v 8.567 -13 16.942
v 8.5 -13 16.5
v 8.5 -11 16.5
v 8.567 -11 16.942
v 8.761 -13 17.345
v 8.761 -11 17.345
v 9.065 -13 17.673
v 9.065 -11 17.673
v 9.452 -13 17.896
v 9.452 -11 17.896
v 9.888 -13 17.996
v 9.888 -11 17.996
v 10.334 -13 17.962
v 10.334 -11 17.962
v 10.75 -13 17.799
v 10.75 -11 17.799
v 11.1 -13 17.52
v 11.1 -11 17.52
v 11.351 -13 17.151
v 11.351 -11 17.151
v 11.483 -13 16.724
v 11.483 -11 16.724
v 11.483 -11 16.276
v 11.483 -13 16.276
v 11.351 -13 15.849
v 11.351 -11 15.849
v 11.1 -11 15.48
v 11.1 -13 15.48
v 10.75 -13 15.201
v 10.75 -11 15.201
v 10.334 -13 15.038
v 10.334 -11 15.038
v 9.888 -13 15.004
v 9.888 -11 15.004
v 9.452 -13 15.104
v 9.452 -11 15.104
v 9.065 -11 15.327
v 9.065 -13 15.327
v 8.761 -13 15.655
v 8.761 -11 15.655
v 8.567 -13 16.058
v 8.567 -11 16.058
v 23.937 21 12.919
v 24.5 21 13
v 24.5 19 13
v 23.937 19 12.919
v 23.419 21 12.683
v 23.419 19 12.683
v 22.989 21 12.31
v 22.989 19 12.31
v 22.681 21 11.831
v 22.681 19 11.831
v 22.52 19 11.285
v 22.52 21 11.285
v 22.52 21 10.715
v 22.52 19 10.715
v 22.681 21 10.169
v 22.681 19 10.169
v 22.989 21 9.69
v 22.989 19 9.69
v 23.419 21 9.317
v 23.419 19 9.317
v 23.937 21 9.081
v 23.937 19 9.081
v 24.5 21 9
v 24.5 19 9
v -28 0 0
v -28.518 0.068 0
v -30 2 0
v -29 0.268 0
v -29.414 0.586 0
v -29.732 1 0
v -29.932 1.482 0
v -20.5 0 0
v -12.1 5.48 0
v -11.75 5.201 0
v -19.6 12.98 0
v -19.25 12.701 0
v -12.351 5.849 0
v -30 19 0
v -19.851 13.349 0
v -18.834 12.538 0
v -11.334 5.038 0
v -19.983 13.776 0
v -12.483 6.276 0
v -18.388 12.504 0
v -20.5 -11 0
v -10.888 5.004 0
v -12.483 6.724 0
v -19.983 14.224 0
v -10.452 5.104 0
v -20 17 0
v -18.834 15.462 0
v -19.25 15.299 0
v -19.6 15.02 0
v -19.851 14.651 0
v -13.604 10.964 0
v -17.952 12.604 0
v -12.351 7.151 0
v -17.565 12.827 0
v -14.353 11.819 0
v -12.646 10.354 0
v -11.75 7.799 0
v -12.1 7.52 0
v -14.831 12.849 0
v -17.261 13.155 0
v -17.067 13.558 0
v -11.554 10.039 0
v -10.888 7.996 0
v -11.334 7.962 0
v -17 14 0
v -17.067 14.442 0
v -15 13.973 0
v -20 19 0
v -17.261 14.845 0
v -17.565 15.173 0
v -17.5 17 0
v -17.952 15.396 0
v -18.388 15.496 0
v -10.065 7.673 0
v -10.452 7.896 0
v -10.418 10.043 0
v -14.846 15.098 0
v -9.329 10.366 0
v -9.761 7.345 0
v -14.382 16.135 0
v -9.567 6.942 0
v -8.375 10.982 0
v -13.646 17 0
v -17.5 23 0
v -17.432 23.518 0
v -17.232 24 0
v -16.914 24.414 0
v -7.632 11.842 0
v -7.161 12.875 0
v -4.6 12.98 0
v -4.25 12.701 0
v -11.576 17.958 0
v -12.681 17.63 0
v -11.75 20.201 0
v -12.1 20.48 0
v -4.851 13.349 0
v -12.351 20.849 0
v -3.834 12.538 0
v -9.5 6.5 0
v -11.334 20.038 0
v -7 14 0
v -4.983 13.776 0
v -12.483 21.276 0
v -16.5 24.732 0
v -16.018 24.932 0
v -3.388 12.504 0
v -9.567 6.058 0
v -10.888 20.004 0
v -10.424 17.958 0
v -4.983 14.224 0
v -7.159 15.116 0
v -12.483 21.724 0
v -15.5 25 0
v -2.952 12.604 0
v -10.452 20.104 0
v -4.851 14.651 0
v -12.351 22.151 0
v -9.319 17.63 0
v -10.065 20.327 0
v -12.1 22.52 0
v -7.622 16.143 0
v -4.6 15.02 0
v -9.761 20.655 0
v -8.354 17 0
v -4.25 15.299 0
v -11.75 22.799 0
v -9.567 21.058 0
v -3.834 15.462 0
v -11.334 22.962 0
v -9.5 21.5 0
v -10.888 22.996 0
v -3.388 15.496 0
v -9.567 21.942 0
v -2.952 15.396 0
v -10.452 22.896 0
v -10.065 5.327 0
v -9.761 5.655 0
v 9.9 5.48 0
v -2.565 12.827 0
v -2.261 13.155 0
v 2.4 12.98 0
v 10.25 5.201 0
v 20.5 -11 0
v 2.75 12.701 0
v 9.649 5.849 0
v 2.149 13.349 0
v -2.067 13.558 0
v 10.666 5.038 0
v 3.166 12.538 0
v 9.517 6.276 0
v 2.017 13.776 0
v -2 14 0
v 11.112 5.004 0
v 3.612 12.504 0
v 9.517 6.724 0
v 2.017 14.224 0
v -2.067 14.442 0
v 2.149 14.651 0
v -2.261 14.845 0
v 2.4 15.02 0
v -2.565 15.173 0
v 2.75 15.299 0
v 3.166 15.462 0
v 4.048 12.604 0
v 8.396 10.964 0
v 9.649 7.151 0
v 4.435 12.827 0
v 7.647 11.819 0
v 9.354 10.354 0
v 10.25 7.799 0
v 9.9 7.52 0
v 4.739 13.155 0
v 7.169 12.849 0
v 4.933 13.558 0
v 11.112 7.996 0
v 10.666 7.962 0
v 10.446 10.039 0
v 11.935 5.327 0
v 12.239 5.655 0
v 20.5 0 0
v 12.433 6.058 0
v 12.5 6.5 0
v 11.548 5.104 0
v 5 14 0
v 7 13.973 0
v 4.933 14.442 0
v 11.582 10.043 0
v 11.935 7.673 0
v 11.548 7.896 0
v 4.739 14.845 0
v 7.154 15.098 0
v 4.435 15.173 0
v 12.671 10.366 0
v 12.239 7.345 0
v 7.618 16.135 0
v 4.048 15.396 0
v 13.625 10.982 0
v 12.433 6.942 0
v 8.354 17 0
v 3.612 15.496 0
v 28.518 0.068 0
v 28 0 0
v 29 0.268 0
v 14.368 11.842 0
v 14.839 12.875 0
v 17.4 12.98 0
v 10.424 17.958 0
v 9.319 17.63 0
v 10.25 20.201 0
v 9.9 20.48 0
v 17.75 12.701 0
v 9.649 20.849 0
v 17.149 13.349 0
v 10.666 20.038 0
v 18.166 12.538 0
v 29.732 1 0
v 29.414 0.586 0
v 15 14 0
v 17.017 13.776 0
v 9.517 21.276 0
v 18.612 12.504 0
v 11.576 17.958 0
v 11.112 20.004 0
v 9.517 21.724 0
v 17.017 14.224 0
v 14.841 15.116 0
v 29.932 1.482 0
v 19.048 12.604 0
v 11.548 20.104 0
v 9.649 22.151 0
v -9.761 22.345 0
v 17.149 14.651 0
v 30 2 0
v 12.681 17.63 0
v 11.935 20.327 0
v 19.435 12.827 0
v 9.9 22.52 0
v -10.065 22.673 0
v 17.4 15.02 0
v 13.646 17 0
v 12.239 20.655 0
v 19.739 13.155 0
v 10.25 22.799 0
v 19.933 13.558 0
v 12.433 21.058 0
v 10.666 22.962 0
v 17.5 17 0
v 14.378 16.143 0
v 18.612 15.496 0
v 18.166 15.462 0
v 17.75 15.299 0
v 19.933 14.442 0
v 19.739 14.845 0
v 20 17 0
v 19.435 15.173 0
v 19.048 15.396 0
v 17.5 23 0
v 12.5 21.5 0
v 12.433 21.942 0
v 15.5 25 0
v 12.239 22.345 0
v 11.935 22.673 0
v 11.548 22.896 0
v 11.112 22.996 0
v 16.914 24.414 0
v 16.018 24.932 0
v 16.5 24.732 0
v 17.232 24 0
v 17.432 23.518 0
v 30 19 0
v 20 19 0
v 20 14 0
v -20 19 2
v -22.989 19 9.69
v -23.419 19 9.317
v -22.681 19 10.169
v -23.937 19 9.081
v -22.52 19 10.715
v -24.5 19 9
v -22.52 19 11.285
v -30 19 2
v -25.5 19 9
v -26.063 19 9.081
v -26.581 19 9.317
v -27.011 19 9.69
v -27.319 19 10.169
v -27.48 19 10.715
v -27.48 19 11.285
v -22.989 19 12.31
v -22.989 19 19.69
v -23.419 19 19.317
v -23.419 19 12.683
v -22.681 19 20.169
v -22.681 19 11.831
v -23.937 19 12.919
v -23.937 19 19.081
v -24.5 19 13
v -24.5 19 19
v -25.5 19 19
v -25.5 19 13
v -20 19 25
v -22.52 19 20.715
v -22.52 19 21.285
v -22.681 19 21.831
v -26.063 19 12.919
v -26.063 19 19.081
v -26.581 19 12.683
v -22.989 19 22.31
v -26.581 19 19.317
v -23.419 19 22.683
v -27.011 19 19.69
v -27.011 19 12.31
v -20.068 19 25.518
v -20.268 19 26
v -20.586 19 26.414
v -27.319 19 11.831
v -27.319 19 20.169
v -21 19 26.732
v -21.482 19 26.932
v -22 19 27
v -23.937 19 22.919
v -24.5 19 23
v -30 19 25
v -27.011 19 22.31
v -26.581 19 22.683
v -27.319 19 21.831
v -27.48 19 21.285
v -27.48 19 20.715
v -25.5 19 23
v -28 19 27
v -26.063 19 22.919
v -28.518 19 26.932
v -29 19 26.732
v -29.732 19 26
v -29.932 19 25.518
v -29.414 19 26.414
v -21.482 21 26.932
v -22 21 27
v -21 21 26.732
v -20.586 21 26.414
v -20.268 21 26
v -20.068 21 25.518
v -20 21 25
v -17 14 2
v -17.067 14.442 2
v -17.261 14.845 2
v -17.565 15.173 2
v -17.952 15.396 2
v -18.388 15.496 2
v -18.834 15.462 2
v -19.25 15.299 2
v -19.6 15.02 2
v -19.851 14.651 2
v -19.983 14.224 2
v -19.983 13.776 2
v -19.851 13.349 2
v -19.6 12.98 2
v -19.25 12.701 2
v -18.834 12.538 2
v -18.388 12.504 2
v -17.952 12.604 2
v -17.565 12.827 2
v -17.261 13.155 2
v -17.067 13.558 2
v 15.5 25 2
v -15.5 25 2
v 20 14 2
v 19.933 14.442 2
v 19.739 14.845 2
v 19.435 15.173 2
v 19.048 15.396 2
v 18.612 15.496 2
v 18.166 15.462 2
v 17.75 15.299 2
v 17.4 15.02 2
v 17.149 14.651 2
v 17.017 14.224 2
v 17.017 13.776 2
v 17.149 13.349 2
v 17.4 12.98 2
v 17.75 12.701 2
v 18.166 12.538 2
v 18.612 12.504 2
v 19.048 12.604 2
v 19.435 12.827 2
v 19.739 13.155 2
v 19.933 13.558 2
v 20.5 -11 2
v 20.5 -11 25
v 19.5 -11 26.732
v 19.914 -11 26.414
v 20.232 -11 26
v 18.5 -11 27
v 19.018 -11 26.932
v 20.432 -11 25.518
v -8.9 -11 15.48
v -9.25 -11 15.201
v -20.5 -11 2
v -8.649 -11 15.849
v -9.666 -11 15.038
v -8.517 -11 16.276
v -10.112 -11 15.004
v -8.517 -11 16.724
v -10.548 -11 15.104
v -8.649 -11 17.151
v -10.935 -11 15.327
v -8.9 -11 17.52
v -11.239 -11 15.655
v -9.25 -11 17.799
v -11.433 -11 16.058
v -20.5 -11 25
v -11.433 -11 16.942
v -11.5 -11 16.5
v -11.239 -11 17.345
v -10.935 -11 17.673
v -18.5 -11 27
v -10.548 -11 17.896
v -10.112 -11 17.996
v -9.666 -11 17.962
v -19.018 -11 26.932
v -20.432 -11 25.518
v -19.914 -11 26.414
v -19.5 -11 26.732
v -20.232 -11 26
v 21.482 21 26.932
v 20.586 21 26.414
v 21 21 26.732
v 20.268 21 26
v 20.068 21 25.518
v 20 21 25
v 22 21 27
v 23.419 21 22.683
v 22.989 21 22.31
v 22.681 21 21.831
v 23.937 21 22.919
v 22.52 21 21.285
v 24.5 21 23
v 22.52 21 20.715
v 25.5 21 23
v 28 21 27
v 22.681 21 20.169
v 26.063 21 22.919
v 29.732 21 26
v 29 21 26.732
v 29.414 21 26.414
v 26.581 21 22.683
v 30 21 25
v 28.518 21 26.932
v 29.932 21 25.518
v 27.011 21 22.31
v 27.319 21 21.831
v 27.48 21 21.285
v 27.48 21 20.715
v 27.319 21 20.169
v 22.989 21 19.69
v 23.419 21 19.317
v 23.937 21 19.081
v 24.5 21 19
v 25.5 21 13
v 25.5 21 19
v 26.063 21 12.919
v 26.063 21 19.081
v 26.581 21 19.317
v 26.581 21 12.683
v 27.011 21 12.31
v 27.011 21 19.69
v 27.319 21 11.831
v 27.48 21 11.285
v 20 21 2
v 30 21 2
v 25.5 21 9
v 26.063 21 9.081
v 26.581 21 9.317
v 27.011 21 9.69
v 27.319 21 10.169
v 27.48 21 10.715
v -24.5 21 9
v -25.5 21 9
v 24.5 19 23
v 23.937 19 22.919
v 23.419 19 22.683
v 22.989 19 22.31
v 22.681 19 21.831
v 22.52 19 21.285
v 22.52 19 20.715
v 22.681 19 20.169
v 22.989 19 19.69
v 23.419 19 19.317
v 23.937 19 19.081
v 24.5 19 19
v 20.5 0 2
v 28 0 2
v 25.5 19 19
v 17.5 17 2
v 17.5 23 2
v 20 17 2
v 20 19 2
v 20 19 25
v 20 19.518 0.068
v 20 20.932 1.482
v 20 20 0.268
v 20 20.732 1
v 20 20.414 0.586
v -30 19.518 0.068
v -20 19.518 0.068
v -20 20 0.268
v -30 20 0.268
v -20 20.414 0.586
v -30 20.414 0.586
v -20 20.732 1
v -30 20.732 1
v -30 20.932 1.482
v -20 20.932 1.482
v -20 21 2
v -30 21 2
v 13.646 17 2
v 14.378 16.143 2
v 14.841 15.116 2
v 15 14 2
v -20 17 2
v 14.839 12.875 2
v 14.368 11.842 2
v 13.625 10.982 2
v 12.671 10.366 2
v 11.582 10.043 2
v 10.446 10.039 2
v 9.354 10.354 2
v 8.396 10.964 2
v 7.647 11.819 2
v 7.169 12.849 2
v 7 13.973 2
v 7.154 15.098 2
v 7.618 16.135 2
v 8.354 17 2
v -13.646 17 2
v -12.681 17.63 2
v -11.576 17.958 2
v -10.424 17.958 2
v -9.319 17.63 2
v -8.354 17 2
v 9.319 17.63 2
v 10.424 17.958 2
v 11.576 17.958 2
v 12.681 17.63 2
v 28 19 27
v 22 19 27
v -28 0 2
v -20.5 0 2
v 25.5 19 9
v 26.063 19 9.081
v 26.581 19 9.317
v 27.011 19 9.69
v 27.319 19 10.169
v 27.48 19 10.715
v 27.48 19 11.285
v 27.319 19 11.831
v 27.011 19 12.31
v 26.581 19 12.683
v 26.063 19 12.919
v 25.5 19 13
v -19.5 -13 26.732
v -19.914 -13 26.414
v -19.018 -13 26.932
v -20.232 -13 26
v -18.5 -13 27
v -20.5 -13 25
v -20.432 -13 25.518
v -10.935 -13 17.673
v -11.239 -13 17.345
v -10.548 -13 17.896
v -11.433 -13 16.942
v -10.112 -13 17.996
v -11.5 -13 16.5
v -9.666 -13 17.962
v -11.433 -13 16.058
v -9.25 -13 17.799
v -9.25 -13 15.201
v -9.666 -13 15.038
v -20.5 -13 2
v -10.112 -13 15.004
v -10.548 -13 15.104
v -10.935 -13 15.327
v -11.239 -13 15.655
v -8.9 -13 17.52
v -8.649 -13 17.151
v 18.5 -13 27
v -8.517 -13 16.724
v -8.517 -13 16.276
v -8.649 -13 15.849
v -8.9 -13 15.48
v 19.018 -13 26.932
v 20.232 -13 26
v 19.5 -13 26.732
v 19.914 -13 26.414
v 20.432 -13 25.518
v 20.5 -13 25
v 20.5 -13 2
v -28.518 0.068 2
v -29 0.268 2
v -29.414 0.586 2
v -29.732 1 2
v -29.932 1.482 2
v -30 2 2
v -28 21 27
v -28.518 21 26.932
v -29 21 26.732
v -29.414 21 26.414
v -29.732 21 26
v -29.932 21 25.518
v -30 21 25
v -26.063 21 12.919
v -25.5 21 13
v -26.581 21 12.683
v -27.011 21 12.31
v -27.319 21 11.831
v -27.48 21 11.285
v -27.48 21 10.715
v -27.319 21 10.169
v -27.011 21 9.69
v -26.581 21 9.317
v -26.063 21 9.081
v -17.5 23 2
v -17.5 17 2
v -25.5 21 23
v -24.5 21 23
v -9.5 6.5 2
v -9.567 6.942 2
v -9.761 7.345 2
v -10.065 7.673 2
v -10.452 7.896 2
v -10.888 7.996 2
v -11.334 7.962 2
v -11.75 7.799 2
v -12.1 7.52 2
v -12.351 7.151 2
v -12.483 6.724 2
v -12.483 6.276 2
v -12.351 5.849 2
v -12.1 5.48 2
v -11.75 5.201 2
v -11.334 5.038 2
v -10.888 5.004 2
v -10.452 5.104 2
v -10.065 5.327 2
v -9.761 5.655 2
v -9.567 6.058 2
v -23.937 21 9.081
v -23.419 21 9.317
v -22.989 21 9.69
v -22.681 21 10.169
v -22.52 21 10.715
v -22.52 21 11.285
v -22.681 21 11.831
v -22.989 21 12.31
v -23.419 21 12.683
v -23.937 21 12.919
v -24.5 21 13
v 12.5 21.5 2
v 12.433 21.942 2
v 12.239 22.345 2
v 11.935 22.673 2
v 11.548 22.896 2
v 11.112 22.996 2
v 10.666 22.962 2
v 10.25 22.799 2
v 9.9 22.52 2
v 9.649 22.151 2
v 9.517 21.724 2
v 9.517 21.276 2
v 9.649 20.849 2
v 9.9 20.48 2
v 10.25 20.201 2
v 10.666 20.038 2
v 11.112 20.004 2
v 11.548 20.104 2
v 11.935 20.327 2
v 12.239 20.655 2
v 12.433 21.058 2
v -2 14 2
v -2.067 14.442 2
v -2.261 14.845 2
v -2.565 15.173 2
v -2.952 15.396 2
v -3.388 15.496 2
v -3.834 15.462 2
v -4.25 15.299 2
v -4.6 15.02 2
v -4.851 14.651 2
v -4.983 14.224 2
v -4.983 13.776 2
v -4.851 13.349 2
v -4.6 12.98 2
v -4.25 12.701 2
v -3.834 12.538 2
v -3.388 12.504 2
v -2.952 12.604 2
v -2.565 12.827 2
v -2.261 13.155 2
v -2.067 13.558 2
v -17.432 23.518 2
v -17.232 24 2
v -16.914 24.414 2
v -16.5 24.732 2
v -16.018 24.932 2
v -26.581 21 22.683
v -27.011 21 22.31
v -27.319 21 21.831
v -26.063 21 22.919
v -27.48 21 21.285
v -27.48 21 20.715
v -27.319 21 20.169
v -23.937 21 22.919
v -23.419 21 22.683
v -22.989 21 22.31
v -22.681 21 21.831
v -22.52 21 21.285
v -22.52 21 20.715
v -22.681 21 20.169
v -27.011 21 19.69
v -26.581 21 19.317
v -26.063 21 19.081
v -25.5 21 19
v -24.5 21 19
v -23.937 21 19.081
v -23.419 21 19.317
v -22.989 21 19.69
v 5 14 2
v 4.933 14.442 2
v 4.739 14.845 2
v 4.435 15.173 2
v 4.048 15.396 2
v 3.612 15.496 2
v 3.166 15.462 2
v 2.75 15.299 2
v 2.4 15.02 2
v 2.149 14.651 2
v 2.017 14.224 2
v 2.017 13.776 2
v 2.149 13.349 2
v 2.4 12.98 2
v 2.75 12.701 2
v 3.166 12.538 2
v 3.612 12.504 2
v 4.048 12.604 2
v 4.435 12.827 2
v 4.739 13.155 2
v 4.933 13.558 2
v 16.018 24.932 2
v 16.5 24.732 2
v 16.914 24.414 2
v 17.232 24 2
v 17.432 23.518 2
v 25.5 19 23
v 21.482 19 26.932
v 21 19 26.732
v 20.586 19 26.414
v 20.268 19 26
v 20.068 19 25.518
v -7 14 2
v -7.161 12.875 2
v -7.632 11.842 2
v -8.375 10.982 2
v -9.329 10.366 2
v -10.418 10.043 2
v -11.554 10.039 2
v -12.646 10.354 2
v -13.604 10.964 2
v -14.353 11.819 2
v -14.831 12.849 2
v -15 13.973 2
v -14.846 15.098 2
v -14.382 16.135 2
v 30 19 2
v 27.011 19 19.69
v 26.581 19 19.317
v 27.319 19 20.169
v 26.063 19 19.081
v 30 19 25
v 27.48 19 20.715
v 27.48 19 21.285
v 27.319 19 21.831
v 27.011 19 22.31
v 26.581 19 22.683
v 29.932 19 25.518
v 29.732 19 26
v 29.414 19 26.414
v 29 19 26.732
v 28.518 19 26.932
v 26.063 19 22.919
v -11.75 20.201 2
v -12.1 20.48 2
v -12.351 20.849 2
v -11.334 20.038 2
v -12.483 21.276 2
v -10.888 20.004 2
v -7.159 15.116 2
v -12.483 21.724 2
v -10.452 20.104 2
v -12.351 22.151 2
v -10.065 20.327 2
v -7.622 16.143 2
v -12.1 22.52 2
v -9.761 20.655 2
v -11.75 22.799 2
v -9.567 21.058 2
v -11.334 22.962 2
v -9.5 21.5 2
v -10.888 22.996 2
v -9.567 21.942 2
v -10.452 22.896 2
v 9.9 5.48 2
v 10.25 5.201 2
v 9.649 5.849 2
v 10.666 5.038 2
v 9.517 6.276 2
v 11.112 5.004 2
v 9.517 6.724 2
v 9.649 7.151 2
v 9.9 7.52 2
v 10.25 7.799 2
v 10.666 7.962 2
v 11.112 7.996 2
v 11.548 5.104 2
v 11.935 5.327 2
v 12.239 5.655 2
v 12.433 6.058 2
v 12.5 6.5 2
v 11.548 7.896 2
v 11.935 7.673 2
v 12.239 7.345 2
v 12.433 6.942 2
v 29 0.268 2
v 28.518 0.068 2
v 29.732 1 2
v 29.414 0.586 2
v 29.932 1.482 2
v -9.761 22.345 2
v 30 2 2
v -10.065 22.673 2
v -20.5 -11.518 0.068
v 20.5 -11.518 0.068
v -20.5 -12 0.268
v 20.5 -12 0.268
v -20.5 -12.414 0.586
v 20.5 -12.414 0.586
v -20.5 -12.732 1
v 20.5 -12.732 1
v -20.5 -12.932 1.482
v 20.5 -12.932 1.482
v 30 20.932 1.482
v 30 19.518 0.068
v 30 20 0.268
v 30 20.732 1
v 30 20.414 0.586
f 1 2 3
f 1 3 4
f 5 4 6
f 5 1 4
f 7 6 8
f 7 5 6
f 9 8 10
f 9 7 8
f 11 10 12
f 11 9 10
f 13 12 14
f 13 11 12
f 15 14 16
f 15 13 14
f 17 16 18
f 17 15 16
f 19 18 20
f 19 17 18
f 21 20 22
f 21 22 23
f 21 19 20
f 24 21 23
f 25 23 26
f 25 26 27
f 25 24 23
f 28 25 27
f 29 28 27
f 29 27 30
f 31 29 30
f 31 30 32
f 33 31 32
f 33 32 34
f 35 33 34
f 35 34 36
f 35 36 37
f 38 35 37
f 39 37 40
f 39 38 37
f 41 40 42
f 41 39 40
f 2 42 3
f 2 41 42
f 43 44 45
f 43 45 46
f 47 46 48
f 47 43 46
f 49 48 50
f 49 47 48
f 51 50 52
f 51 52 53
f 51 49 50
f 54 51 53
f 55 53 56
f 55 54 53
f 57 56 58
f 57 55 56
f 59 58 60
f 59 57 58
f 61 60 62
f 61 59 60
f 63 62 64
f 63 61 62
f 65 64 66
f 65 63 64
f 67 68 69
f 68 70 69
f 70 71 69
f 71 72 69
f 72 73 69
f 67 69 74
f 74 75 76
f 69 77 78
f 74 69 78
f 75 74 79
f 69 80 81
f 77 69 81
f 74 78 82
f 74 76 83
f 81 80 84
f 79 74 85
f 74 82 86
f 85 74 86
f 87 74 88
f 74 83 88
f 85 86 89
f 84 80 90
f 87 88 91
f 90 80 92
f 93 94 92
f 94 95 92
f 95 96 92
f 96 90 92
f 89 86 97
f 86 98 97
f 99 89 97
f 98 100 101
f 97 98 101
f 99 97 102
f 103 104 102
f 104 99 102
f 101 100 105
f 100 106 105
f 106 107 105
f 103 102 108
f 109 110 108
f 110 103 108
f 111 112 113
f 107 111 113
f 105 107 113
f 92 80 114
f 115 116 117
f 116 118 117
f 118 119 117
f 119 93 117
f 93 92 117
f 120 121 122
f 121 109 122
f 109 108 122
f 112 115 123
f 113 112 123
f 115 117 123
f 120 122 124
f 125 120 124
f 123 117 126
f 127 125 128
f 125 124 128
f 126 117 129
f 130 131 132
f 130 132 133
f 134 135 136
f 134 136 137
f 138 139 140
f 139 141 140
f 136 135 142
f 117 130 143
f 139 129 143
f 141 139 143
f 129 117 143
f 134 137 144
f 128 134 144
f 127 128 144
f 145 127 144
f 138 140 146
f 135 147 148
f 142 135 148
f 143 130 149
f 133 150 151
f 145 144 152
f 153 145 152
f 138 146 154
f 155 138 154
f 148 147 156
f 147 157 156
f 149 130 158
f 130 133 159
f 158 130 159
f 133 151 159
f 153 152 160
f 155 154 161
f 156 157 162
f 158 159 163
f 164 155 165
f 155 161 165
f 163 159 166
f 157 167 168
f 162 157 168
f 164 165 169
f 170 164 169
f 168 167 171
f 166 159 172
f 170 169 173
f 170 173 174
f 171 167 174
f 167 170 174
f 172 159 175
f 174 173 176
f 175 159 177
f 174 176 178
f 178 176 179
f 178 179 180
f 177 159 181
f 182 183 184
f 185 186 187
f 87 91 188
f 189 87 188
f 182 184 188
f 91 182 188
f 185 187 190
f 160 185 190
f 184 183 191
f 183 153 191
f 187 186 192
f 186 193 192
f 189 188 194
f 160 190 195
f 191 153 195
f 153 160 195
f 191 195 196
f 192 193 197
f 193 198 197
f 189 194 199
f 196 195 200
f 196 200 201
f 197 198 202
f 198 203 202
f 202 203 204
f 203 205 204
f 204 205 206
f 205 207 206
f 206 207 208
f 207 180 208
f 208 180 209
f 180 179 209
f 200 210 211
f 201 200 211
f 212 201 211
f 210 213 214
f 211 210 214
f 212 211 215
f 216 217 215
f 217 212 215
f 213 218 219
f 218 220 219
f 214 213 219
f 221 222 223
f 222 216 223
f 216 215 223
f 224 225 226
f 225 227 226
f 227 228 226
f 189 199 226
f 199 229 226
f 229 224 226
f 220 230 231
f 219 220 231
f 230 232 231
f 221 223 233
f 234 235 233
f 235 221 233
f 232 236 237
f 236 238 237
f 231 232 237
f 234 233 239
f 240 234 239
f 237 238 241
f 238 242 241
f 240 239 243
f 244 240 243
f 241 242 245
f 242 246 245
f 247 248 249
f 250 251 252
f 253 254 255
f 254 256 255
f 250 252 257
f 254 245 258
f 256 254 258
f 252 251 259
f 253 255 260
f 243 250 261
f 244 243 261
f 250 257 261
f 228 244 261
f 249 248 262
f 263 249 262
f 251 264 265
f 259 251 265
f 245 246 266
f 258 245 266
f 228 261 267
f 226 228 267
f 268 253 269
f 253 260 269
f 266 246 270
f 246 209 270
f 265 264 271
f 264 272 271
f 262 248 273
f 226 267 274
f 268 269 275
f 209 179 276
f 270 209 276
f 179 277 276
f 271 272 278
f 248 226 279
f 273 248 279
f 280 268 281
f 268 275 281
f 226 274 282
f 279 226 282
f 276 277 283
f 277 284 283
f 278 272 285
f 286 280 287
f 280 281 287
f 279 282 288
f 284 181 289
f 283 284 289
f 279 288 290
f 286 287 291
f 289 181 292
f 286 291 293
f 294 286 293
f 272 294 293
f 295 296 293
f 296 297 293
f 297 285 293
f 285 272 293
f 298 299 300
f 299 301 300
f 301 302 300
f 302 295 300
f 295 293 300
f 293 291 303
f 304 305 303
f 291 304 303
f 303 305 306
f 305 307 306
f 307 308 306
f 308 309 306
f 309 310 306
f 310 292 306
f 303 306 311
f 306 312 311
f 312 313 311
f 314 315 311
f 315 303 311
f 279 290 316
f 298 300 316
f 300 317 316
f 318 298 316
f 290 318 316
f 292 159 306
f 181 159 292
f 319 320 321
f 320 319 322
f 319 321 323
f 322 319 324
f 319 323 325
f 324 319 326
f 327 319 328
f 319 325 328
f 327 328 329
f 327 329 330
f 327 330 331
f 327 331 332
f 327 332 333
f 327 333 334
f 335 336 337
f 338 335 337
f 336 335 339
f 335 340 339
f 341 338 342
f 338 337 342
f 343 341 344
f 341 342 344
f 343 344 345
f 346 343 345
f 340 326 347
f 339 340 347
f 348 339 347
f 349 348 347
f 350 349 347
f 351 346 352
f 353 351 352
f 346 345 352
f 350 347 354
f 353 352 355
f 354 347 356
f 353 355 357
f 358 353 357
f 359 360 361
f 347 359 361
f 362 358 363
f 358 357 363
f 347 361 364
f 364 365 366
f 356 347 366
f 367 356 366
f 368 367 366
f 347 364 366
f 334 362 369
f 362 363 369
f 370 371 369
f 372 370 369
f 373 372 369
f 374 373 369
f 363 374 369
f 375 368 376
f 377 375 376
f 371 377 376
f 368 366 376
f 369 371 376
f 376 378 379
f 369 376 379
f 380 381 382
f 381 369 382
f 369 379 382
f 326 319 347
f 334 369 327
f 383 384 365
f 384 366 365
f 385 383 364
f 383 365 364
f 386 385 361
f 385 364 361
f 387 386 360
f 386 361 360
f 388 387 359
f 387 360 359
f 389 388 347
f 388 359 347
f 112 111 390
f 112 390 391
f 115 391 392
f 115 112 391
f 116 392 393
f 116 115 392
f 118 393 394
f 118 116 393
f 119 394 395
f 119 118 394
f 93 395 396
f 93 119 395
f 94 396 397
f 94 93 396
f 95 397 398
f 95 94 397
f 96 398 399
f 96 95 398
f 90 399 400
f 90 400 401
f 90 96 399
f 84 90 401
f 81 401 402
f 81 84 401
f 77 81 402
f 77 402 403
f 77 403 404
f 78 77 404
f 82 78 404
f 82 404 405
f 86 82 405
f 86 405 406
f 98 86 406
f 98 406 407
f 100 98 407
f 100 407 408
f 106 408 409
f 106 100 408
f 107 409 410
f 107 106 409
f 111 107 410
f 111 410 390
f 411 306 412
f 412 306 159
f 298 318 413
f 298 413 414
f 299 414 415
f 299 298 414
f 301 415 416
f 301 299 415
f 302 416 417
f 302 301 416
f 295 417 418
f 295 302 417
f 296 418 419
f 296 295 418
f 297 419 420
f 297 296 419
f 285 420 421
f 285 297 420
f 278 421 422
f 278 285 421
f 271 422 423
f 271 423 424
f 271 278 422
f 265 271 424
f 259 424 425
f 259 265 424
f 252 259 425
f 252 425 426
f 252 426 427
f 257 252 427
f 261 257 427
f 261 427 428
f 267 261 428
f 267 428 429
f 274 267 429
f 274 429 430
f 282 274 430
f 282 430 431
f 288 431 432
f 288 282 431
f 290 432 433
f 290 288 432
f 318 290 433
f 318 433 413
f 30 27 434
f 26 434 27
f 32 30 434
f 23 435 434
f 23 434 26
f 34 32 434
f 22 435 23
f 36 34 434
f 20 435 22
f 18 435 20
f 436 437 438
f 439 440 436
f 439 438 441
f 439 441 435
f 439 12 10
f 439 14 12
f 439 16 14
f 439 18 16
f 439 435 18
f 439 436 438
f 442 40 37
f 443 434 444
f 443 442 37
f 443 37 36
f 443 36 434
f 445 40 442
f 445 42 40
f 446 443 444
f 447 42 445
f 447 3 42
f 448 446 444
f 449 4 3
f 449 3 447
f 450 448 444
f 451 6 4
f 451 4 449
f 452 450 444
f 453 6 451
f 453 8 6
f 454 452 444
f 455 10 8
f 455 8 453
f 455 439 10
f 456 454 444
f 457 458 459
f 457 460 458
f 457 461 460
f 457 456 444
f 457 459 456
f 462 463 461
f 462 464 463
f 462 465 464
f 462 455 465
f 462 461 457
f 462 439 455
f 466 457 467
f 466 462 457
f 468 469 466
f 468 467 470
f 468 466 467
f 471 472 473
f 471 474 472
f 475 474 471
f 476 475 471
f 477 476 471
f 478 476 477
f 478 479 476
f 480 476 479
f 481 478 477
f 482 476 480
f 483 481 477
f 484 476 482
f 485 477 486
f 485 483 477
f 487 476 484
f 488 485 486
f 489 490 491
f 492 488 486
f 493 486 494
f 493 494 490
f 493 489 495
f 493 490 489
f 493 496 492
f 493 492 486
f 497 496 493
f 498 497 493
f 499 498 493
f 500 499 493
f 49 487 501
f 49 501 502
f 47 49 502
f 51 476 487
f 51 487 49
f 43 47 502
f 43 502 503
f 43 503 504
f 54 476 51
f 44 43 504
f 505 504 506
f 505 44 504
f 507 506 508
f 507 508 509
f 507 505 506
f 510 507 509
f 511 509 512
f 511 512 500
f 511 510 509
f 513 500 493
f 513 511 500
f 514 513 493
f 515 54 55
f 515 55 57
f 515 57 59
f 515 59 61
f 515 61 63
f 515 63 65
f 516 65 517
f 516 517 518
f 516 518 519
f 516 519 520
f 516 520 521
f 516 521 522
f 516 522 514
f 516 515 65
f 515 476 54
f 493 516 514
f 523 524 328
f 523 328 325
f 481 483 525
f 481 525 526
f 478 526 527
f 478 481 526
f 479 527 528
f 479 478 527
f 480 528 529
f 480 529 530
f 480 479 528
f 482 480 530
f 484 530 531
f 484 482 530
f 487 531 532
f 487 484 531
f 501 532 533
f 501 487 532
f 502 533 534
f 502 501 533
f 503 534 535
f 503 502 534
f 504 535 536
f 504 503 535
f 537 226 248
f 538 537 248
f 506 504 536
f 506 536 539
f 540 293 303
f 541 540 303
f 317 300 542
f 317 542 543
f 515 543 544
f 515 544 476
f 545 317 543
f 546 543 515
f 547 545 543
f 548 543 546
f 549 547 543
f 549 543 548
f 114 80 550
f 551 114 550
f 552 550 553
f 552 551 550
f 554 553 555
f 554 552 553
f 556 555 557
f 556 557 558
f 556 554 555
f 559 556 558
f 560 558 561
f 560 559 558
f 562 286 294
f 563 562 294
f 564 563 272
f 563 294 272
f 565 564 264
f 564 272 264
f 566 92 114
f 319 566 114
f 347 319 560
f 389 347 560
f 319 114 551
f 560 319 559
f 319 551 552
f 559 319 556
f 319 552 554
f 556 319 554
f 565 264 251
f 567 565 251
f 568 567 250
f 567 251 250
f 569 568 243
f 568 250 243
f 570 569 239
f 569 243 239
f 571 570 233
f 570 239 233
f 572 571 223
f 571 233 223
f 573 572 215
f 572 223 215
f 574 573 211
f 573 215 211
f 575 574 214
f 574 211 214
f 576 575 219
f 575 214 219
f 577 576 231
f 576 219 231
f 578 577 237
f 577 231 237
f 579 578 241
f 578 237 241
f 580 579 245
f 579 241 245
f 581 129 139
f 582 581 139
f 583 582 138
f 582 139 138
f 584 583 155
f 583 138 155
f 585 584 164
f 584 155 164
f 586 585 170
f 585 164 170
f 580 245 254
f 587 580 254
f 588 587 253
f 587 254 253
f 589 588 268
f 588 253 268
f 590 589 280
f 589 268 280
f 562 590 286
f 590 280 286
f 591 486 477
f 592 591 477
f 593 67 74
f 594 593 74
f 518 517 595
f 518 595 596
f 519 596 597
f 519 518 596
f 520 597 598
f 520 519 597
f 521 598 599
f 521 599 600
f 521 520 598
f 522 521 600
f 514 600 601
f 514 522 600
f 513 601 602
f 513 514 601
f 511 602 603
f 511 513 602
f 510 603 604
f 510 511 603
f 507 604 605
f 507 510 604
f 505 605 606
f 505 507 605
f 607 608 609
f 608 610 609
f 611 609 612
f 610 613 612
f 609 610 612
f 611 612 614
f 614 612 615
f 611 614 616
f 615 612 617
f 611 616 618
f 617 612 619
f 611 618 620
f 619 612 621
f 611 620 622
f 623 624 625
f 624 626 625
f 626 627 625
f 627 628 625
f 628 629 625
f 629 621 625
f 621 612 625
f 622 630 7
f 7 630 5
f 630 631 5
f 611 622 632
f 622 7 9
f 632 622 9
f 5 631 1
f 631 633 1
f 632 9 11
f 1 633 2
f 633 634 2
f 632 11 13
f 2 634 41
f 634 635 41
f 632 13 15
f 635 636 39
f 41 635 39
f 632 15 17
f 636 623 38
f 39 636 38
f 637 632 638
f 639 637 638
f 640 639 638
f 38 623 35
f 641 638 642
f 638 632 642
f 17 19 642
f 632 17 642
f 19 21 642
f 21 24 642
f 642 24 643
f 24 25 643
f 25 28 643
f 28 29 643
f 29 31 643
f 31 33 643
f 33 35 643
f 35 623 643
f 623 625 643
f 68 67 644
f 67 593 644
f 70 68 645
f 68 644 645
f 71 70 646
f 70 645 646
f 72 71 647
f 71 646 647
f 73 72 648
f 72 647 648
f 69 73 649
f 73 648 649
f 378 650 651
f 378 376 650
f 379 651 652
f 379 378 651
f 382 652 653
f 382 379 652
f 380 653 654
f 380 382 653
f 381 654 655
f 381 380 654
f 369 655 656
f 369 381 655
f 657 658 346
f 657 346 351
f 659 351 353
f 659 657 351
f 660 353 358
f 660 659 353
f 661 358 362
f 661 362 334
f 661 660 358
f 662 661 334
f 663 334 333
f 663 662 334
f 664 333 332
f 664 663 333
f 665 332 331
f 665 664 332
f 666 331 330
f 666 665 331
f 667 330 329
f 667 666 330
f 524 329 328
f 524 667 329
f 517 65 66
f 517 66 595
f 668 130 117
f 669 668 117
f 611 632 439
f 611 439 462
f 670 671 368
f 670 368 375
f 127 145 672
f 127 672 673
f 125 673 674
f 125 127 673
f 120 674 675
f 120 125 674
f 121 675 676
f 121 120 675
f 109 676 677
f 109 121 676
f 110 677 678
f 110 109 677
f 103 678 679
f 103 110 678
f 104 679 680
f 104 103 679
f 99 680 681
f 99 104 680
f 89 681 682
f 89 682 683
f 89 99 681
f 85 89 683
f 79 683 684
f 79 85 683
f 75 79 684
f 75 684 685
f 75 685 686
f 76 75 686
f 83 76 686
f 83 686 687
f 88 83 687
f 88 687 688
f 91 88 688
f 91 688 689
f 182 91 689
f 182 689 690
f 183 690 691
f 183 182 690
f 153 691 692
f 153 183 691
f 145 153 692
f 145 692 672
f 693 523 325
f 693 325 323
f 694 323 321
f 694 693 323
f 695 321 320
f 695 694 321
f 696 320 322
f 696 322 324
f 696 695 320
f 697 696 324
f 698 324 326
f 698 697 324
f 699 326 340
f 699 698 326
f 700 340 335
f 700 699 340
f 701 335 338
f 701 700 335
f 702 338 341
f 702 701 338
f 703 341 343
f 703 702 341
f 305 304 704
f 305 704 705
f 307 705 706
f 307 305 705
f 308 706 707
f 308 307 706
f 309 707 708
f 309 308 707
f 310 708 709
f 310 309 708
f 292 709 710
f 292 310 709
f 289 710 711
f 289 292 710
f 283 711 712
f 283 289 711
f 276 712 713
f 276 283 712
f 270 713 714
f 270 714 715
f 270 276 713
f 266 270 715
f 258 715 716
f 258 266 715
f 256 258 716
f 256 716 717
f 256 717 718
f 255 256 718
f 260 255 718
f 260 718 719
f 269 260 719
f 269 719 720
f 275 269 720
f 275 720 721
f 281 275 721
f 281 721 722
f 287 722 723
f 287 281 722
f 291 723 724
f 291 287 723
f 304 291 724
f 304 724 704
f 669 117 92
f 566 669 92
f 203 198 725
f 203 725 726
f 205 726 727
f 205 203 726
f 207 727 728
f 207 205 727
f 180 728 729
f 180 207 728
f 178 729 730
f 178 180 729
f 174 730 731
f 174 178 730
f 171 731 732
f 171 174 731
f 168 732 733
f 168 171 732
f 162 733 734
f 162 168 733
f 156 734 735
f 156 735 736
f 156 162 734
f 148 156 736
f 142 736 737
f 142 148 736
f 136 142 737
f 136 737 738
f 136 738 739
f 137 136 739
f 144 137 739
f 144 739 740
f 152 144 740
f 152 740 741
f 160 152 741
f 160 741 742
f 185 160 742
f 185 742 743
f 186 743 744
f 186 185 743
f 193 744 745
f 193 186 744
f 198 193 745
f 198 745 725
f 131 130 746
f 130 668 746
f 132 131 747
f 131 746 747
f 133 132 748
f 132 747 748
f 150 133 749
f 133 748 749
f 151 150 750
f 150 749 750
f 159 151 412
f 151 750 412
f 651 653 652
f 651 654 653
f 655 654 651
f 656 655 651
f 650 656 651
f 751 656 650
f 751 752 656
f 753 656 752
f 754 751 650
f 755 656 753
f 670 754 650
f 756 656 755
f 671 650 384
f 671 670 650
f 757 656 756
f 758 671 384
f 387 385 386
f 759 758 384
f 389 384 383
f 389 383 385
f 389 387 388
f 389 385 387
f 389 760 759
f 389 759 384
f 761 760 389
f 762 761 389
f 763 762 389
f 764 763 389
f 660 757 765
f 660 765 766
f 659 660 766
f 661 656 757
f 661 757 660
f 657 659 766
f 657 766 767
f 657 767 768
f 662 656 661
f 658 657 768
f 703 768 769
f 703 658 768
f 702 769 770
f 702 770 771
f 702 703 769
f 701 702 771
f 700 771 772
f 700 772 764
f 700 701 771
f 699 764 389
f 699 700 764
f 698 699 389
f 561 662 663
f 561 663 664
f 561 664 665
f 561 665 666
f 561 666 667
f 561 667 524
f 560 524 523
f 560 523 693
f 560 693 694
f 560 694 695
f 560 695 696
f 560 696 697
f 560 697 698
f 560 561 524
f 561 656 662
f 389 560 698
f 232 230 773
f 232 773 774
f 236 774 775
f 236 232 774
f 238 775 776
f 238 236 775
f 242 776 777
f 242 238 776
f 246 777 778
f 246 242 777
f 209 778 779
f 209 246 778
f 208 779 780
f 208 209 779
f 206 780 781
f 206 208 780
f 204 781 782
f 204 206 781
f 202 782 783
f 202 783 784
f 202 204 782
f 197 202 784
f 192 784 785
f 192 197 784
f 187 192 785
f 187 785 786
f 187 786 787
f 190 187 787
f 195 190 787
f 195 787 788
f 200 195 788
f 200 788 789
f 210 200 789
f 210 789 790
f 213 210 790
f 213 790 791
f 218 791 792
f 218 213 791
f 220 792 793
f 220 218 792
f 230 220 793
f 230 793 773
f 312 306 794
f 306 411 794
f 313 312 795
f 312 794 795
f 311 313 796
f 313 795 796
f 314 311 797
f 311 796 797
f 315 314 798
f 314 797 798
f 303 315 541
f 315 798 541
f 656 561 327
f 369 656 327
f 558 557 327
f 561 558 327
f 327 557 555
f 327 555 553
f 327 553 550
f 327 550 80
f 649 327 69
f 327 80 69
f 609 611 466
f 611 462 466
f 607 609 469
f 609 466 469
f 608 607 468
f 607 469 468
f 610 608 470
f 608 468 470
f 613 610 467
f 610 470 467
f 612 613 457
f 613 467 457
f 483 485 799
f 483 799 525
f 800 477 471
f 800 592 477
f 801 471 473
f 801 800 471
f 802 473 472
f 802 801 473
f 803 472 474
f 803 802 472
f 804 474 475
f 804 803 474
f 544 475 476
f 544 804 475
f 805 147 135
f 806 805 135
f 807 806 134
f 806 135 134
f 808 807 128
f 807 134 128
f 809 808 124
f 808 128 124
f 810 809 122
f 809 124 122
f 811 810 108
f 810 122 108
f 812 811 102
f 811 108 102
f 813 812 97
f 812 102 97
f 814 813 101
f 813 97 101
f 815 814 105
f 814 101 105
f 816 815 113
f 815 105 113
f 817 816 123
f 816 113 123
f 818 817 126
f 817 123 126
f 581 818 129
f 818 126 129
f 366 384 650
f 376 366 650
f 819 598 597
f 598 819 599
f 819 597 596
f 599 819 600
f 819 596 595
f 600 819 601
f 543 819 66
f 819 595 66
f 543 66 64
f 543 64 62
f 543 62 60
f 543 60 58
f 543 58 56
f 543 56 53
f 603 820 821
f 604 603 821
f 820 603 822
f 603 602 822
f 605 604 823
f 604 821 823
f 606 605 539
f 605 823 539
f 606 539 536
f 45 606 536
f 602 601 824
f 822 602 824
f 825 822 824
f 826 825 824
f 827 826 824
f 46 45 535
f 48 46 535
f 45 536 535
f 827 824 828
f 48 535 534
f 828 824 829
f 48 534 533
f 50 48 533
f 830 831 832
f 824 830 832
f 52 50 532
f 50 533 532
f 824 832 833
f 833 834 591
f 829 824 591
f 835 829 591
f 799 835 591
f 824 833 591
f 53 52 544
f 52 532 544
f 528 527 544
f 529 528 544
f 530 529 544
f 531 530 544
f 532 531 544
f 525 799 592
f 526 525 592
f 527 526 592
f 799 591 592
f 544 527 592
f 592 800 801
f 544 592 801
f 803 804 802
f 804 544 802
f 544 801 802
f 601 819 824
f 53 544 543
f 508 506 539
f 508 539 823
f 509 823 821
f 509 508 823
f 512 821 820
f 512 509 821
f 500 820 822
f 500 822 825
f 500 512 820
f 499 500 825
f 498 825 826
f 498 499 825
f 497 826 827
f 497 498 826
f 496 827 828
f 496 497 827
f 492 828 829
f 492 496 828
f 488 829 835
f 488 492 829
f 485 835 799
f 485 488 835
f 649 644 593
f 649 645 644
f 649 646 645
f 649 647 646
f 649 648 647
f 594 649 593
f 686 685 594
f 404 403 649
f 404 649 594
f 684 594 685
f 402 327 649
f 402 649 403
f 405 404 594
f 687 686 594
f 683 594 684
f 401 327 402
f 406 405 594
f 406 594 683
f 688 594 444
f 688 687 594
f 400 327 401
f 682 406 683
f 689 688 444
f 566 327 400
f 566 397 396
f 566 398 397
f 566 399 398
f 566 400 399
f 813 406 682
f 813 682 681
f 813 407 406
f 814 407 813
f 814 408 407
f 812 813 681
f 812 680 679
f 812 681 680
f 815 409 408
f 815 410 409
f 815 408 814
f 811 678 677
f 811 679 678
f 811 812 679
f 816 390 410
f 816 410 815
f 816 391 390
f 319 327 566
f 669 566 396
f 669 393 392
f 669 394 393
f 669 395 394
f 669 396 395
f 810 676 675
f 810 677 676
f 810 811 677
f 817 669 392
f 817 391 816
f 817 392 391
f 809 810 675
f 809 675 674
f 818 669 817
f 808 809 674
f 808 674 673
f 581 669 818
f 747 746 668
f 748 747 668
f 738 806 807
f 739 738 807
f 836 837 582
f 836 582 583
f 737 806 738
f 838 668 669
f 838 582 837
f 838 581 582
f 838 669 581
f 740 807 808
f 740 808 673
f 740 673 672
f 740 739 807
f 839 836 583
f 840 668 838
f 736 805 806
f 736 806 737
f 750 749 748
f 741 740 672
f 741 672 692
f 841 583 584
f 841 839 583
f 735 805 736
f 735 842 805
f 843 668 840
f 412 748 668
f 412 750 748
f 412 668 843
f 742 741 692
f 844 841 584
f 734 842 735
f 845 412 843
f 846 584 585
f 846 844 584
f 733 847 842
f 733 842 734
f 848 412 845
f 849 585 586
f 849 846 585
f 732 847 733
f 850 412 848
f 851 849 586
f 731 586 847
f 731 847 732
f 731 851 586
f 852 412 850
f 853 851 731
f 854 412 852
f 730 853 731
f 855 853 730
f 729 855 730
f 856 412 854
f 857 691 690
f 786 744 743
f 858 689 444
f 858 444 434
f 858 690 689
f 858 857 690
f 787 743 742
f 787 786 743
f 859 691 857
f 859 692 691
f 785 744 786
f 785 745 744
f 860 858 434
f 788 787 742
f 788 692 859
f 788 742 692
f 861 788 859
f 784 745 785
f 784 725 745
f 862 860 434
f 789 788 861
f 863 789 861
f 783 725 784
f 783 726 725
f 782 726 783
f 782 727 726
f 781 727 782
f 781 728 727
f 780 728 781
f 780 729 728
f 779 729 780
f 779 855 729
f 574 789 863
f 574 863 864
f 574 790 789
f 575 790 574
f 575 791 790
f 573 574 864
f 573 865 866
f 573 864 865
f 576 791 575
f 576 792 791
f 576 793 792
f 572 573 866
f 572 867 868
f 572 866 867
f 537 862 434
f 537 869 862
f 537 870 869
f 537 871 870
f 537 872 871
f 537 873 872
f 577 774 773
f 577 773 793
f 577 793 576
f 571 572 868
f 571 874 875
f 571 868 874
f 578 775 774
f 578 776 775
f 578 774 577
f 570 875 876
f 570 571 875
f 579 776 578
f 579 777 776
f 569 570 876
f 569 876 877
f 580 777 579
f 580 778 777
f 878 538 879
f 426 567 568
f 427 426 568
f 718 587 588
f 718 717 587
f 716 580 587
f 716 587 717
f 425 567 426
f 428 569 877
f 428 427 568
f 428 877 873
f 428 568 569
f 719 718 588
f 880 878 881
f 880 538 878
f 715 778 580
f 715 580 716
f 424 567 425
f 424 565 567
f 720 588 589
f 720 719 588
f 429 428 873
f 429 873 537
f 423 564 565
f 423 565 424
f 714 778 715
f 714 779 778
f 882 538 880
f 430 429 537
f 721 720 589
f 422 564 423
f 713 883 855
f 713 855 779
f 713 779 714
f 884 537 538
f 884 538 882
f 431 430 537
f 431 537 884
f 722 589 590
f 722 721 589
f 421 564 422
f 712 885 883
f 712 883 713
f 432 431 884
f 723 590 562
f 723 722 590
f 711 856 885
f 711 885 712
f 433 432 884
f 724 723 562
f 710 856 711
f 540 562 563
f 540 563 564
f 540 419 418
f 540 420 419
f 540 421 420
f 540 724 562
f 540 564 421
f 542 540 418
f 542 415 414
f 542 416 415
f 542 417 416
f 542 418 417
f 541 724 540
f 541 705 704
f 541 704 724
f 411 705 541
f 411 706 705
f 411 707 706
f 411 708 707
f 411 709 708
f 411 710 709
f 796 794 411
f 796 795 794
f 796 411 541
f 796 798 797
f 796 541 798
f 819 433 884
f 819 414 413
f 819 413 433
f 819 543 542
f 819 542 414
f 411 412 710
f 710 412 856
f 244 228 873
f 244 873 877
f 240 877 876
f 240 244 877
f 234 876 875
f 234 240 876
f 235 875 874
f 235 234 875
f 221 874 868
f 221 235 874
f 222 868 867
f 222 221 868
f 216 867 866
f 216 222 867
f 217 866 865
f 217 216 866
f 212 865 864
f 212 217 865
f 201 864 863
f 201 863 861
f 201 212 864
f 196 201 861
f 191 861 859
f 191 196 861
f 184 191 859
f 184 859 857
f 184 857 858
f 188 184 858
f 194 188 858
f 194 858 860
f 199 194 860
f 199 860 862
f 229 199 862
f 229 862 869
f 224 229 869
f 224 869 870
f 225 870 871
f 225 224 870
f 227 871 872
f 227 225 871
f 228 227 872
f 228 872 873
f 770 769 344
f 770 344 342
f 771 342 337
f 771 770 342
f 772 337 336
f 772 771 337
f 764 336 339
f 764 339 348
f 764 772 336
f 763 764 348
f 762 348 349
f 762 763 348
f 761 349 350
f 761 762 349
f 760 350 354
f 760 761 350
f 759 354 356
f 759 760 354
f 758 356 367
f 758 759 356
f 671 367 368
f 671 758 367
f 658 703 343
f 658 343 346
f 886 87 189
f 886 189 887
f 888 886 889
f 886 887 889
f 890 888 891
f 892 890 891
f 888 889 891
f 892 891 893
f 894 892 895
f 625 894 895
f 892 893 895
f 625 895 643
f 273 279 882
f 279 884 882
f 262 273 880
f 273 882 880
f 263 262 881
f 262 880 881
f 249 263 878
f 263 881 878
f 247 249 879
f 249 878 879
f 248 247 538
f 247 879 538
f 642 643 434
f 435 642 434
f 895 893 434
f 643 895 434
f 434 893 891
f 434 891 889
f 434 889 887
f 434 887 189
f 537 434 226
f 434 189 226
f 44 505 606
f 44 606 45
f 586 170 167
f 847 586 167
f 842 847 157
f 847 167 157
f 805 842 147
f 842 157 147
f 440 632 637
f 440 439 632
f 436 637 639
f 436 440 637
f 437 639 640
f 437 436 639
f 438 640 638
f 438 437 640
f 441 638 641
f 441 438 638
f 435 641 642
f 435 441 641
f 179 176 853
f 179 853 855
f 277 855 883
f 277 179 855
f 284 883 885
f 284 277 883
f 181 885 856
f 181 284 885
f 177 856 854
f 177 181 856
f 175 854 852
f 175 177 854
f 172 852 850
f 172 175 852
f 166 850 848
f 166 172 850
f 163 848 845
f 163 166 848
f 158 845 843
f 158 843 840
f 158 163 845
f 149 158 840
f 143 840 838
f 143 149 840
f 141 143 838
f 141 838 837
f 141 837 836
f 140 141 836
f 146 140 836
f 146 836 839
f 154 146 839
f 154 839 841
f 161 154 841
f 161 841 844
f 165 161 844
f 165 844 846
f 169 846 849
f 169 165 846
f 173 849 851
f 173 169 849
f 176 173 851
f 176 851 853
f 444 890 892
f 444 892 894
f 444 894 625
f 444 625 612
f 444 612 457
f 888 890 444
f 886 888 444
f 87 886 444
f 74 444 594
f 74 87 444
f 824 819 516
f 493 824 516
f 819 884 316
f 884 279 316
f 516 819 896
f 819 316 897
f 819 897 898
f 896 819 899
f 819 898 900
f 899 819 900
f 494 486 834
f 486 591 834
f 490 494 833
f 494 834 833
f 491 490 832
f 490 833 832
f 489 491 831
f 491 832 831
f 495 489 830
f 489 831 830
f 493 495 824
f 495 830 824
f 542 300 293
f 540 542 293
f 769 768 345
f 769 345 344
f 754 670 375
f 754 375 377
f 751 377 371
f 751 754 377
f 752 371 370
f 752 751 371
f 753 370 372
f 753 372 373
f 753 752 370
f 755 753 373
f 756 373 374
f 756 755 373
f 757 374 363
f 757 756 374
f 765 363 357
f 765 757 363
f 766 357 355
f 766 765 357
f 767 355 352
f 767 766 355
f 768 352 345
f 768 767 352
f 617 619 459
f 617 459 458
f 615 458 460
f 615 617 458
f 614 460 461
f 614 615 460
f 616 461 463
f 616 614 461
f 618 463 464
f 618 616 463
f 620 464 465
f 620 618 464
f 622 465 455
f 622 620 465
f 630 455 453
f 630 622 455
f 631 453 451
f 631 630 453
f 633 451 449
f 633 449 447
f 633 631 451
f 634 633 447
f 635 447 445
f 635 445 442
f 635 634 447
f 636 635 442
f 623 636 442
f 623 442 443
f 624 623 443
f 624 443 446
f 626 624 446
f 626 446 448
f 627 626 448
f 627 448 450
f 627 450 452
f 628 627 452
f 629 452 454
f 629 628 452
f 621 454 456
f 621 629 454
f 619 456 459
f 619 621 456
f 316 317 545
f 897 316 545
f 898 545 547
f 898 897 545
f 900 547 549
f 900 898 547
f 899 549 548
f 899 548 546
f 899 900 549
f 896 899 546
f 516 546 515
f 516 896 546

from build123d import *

# Parameters (mm, degrees)
F0_R     = 1.5
F0_W     = 41
F0_H     = 13
F0_W_2   = 10
F0_H_2   = 4
F7_DEPTH = 2
F4_W     = 41
F4_H     = 27
F4_R     = 1.5
F8_DEPTH = 2
F6_W     = 10
F6_H     = 27
F5_W     = 10
F5_H     = 27
F9_DEPTH = 2
F10_R    = 2


with BuildPart() as f7:
    # F0 (on Top) → F7 (new body)
    with BuildSketch(Plane.XY):
        with BuildLine():
            Line((-13.645751, 17), (-17.5, 17))
            Line((-17.5, 17), (-20, 17))
            Line((-20, 17), (-30, 17))
            Line((-30, 17), (-30, 0))
            Line((-30, 0), (-20.5, 0))
            Line((-20.5, 0), (20.5, 0))
            Line((20.5, 0), (30, 0))
            Line((30, 0), (30, 17))
            Line((30, 17), (20, 17))
            Line((20, 17), (17.5, 17))
            Line((17.5, 17), (13.645751, 17))
            ThreePointArc((13.645751, 17), (14.645751, 15.645751), (15, 14))
            ThreePointArc((15, 14), (9.354249, 10.354249), (8.354249, 17))
            Line((8.354249, 17), (-8.354249, 17))
            ThreePointArc((-8.354249, 17), (-7.354249, 15.645751), (-7, 14))
            ThreePointArc((-7, 14), (-12.645751, 10.354249), (-13.645751, 17))
        make_face()
        with Locations((-18.5, 14)):
            Circle(F0_R, mode=Mode.SUBTRACT)
        with Locations((-11, 6.5)):
            Circle(F0_R, mode=Mode.SUBTRACT)
        with Locations((-3.5, 14)):
            Circle(F0_R, mode=Mode.SUBTRACT)
        with Locations((11, 6.5)):
            Circle(F0_R, mode=Mode.SUBTRACT)
        with Locations((3.5, 14)):
            Circle(F0_R, mode=Mode.SUBTRACT)
        with Locations((18.5, 14)):
            Circle(F0_R, mode=Mode.SUBTRACT)
        with BuildLine():
            Line((17.5, 25), (-17.5, 25))
            Line((-17.5, 25), (-17.5, 17))
            Line((-17.5, 17), (-13.645751, 17))
            ThreePointArc((-13.645751, 17), (-11, 18), (-8.354249, 17))
            Line((-8.354249, 17), (8.354249, 17))
            ThreePointArc((8.354249, 17), (11, 18), (13.645751, 17))
            Line((13.645751, 17), (17.5, 17))
            Line((17.5, 17), (17.5, 25))
        make_face()
        with Locations((-11, 21.5)):
            Circle(F0_R, mode=Mode.SUBTRACT)
        with Locations((11, 21.5)):
            Circle(F0_R, mode=Mode.SUBTRACT)
        with Locations((0, -6.5)):
            Rectangle(F0_W, F0_H)
        with Locations((25, 19)):
            Rectangle(F0_W_2, F0_H_2)
        with Locations((-25, 19)):
            Rectangle(F0_W_2, F0_H_2)
    extrude(amount=F7_DEPTH)

    # F4 (on face) → F8 (join)
    with BuildSketch(Plane(origin=(0, -13, 0), x_dir=(-1, 0, 0), z_dir=(0, 1, 0))):
        with Locations((0, 13.5)):
            Rectangle(F4_W, F4_H)
        with Locations((-10, 16.5)):
            Circle(F4_R, mode=Mode.SUBTRACT)
        with Locations((10, 16.5)):
            Circle(F4_R, mode=Mode.SUBTRACT)
    extrude(amount=F8_DEPTH)

    # F6 (on face) + F5 (on face) → F9 (join)
    with BuildSketch(Plane(origin=(0, 21, 0), x_dir=(-1, 0, 0), z_dir=(0, 1, 0))):
        with Locations((25, 13.5)):
            Rectangle(F6_W, F6_H)
        with BuildLine():
            ThreePointArc((24.5, 9), (22.5, 11), (24.5, 13))
            Line((24.5, 13), (25.5, 13))
            ThreePointArc((25.5, 13), (27.5, 11), (25.5, 9))
            Line((25.5, 9), (24.5, 9))
        make_face(mode=Mode.SUBTRACT)
        with BuildLine():
            ThreePointArc((24.5, 19), (22.5, 21), (24.5, 23))
            Line((24.5, 23), (25.5, 23))
            ThreePointArc((25.5, 23), (27.5, 21), (25.5, 19))
            Line((25.5, 19), (24.5, 19))
        make_face(mode=Mode.SUBTRACT)
    with BuildSketch(Plane(origin=(0, 21, 0), x_dir=(-1, 0, 0), z_dir=(0, 1, 0))):
        with Locations((-25, 13.5)):
            Rectangle(F5_W, F5_H)
        with BuildLine():
            ThreePointArc((-25.5, 9), (-27.5, 11), (-25.5, 13))
            Line((-25.5, 13), (-24.5, 13))
            ThreePointArc((-24.5, 13), (-22.5, 11), (-24.5, 9))
            Line((-24.5, 9), (-25.5, 9))
        make_face(mode=Mode.SUBTRACT)
        with BuildLine():
            ThreePointArc((-25.5, 19), (-27.5, 21), (-25.5, 23))
            Line((-25.5, 23), (-24.5, 23))
            ThreePointArc((-24.5, 23), (-22.5, 21), (-24.5, 19))
            Line((-24.5, 19), (-25.5, 19))
        make_face(mode=Mode.SUBTRACT)
    extrude(amount=-F9_DEPTH)

    # F10
    f10_edges = [f7.edges().sort_by_distance(p)[0] for p in [
        (0, -13, 0),
        (-30, 0, 1),
        (30, 0, 1),
        (25, 21, 0),
        (-25, 21, 0),
        (17.5, 25, 1),
        (-17.5, 25, 1),
        (30, 20, 27),
        (20, 20, 27),
        (-20, 20, 27),
        (-30, 20, 27),
        (-20.5, -12, 27),
        (20.5, -12, 27),
    ]]
    fillet(f10_edges, radius=F10_R)


solid = f7.part
